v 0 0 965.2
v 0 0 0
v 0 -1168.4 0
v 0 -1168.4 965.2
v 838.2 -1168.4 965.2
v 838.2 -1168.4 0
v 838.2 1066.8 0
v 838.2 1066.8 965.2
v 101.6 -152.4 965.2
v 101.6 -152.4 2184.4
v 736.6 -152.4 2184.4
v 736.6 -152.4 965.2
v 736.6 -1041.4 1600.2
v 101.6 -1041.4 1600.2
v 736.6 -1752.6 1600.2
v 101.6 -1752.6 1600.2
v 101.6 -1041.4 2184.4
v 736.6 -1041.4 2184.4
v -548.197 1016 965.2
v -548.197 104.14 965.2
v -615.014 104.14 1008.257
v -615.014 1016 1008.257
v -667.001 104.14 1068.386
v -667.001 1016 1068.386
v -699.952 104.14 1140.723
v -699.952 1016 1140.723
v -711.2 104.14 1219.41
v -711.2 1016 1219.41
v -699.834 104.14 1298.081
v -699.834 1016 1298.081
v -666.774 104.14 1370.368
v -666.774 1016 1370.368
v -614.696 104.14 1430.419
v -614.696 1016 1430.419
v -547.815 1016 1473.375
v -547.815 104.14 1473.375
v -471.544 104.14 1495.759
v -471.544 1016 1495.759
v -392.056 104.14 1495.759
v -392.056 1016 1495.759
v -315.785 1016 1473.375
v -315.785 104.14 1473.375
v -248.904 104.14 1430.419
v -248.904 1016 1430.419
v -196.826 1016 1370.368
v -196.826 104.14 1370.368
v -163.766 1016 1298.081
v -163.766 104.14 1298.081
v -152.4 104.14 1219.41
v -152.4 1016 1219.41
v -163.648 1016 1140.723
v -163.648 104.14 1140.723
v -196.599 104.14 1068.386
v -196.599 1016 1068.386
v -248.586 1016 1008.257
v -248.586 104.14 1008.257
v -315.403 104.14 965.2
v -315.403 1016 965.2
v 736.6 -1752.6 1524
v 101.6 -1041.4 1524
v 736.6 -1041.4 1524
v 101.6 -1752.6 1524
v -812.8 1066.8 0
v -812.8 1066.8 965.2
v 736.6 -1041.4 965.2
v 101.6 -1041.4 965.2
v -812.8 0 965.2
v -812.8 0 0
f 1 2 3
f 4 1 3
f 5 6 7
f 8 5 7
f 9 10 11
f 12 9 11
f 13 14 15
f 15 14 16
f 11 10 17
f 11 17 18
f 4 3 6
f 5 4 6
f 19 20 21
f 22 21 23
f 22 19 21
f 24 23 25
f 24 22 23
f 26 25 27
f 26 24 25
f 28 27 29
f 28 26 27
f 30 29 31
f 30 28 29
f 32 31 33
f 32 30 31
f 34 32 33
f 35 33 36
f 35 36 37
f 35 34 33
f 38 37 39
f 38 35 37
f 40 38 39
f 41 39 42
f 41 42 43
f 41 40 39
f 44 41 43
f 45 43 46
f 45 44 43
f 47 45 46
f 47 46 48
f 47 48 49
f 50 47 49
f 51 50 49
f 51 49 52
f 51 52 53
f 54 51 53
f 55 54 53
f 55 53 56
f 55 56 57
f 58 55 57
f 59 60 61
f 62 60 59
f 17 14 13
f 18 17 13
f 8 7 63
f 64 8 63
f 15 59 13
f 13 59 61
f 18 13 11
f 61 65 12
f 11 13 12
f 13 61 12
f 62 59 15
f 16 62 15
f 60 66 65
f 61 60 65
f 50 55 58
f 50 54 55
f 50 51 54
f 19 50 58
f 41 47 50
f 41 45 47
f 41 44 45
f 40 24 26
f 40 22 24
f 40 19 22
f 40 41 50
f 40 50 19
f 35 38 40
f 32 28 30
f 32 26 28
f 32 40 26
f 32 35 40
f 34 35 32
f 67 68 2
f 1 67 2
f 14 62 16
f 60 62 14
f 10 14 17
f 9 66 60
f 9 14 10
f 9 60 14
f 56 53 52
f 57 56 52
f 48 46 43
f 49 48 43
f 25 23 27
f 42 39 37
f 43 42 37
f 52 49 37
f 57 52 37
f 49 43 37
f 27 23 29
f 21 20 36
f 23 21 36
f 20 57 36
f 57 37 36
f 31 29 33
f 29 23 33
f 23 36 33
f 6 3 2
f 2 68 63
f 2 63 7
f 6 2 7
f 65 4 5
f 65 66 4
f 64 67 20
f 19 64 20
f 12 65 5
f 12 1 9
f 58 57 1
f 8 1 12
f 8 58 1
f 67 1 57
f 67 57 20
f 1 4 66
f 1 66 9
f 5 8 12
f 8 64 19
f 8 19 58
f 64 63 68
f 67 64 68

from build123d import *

# Parameters (mm, degrees)
F1_DEPTH = 965.2
F3_R     = 279.4
F4_DEPTH = 911.86
F5_W     = 635
F5_H     = 889
F6_DEPTH = 1219.2
F7_W     = 711.2
F7_H     = 76.2
F8_DEPTH = 635


with BuildPart() as f1:
    # F0 (on Top) → F1 (new body)
    with BuildSketch(Plane.XY):
        Polygon((-812.8, 0), (0, 0), (0, -1168.4), (838.2, -1168.4), (838.2, 1066.8), (-812.8, 1066.8), align=None)
    extrude(amount=F1_DEPTH)

    # F3 (on offset) → F4 (join)
    with BuildSketch(Plane(origin=(0, 1016, 0), x_dir=(-1, 0, 0), z_dir=(0, 1, 0))):
        with Locations((431.8, 1219.2)):
            Circle(F3_R)
    extrude(amount=-F4_DEPTH)

    # F5 (on face) → F6 (join)
    with BuildSketch(Plane.XY.offset(965.2)):
        with Locations((419.1, -596.9)):
            Rectangle(F5_W, F5_H)
    extrude(amount=F6_DEPTH)

    # F7 (on face) → F8 (join, through all)
    with BuildSketch(Plane(origin=(101.6, 0, 0), x_dir=(0, -1, 0), z_dir=(-1, 0, 0))):
        with Locations((1397, 1562.1)):
            Rectangle(F7_W, F7_H)
    extrude(amount=-F8_DEPTH)


solid = f1.part
